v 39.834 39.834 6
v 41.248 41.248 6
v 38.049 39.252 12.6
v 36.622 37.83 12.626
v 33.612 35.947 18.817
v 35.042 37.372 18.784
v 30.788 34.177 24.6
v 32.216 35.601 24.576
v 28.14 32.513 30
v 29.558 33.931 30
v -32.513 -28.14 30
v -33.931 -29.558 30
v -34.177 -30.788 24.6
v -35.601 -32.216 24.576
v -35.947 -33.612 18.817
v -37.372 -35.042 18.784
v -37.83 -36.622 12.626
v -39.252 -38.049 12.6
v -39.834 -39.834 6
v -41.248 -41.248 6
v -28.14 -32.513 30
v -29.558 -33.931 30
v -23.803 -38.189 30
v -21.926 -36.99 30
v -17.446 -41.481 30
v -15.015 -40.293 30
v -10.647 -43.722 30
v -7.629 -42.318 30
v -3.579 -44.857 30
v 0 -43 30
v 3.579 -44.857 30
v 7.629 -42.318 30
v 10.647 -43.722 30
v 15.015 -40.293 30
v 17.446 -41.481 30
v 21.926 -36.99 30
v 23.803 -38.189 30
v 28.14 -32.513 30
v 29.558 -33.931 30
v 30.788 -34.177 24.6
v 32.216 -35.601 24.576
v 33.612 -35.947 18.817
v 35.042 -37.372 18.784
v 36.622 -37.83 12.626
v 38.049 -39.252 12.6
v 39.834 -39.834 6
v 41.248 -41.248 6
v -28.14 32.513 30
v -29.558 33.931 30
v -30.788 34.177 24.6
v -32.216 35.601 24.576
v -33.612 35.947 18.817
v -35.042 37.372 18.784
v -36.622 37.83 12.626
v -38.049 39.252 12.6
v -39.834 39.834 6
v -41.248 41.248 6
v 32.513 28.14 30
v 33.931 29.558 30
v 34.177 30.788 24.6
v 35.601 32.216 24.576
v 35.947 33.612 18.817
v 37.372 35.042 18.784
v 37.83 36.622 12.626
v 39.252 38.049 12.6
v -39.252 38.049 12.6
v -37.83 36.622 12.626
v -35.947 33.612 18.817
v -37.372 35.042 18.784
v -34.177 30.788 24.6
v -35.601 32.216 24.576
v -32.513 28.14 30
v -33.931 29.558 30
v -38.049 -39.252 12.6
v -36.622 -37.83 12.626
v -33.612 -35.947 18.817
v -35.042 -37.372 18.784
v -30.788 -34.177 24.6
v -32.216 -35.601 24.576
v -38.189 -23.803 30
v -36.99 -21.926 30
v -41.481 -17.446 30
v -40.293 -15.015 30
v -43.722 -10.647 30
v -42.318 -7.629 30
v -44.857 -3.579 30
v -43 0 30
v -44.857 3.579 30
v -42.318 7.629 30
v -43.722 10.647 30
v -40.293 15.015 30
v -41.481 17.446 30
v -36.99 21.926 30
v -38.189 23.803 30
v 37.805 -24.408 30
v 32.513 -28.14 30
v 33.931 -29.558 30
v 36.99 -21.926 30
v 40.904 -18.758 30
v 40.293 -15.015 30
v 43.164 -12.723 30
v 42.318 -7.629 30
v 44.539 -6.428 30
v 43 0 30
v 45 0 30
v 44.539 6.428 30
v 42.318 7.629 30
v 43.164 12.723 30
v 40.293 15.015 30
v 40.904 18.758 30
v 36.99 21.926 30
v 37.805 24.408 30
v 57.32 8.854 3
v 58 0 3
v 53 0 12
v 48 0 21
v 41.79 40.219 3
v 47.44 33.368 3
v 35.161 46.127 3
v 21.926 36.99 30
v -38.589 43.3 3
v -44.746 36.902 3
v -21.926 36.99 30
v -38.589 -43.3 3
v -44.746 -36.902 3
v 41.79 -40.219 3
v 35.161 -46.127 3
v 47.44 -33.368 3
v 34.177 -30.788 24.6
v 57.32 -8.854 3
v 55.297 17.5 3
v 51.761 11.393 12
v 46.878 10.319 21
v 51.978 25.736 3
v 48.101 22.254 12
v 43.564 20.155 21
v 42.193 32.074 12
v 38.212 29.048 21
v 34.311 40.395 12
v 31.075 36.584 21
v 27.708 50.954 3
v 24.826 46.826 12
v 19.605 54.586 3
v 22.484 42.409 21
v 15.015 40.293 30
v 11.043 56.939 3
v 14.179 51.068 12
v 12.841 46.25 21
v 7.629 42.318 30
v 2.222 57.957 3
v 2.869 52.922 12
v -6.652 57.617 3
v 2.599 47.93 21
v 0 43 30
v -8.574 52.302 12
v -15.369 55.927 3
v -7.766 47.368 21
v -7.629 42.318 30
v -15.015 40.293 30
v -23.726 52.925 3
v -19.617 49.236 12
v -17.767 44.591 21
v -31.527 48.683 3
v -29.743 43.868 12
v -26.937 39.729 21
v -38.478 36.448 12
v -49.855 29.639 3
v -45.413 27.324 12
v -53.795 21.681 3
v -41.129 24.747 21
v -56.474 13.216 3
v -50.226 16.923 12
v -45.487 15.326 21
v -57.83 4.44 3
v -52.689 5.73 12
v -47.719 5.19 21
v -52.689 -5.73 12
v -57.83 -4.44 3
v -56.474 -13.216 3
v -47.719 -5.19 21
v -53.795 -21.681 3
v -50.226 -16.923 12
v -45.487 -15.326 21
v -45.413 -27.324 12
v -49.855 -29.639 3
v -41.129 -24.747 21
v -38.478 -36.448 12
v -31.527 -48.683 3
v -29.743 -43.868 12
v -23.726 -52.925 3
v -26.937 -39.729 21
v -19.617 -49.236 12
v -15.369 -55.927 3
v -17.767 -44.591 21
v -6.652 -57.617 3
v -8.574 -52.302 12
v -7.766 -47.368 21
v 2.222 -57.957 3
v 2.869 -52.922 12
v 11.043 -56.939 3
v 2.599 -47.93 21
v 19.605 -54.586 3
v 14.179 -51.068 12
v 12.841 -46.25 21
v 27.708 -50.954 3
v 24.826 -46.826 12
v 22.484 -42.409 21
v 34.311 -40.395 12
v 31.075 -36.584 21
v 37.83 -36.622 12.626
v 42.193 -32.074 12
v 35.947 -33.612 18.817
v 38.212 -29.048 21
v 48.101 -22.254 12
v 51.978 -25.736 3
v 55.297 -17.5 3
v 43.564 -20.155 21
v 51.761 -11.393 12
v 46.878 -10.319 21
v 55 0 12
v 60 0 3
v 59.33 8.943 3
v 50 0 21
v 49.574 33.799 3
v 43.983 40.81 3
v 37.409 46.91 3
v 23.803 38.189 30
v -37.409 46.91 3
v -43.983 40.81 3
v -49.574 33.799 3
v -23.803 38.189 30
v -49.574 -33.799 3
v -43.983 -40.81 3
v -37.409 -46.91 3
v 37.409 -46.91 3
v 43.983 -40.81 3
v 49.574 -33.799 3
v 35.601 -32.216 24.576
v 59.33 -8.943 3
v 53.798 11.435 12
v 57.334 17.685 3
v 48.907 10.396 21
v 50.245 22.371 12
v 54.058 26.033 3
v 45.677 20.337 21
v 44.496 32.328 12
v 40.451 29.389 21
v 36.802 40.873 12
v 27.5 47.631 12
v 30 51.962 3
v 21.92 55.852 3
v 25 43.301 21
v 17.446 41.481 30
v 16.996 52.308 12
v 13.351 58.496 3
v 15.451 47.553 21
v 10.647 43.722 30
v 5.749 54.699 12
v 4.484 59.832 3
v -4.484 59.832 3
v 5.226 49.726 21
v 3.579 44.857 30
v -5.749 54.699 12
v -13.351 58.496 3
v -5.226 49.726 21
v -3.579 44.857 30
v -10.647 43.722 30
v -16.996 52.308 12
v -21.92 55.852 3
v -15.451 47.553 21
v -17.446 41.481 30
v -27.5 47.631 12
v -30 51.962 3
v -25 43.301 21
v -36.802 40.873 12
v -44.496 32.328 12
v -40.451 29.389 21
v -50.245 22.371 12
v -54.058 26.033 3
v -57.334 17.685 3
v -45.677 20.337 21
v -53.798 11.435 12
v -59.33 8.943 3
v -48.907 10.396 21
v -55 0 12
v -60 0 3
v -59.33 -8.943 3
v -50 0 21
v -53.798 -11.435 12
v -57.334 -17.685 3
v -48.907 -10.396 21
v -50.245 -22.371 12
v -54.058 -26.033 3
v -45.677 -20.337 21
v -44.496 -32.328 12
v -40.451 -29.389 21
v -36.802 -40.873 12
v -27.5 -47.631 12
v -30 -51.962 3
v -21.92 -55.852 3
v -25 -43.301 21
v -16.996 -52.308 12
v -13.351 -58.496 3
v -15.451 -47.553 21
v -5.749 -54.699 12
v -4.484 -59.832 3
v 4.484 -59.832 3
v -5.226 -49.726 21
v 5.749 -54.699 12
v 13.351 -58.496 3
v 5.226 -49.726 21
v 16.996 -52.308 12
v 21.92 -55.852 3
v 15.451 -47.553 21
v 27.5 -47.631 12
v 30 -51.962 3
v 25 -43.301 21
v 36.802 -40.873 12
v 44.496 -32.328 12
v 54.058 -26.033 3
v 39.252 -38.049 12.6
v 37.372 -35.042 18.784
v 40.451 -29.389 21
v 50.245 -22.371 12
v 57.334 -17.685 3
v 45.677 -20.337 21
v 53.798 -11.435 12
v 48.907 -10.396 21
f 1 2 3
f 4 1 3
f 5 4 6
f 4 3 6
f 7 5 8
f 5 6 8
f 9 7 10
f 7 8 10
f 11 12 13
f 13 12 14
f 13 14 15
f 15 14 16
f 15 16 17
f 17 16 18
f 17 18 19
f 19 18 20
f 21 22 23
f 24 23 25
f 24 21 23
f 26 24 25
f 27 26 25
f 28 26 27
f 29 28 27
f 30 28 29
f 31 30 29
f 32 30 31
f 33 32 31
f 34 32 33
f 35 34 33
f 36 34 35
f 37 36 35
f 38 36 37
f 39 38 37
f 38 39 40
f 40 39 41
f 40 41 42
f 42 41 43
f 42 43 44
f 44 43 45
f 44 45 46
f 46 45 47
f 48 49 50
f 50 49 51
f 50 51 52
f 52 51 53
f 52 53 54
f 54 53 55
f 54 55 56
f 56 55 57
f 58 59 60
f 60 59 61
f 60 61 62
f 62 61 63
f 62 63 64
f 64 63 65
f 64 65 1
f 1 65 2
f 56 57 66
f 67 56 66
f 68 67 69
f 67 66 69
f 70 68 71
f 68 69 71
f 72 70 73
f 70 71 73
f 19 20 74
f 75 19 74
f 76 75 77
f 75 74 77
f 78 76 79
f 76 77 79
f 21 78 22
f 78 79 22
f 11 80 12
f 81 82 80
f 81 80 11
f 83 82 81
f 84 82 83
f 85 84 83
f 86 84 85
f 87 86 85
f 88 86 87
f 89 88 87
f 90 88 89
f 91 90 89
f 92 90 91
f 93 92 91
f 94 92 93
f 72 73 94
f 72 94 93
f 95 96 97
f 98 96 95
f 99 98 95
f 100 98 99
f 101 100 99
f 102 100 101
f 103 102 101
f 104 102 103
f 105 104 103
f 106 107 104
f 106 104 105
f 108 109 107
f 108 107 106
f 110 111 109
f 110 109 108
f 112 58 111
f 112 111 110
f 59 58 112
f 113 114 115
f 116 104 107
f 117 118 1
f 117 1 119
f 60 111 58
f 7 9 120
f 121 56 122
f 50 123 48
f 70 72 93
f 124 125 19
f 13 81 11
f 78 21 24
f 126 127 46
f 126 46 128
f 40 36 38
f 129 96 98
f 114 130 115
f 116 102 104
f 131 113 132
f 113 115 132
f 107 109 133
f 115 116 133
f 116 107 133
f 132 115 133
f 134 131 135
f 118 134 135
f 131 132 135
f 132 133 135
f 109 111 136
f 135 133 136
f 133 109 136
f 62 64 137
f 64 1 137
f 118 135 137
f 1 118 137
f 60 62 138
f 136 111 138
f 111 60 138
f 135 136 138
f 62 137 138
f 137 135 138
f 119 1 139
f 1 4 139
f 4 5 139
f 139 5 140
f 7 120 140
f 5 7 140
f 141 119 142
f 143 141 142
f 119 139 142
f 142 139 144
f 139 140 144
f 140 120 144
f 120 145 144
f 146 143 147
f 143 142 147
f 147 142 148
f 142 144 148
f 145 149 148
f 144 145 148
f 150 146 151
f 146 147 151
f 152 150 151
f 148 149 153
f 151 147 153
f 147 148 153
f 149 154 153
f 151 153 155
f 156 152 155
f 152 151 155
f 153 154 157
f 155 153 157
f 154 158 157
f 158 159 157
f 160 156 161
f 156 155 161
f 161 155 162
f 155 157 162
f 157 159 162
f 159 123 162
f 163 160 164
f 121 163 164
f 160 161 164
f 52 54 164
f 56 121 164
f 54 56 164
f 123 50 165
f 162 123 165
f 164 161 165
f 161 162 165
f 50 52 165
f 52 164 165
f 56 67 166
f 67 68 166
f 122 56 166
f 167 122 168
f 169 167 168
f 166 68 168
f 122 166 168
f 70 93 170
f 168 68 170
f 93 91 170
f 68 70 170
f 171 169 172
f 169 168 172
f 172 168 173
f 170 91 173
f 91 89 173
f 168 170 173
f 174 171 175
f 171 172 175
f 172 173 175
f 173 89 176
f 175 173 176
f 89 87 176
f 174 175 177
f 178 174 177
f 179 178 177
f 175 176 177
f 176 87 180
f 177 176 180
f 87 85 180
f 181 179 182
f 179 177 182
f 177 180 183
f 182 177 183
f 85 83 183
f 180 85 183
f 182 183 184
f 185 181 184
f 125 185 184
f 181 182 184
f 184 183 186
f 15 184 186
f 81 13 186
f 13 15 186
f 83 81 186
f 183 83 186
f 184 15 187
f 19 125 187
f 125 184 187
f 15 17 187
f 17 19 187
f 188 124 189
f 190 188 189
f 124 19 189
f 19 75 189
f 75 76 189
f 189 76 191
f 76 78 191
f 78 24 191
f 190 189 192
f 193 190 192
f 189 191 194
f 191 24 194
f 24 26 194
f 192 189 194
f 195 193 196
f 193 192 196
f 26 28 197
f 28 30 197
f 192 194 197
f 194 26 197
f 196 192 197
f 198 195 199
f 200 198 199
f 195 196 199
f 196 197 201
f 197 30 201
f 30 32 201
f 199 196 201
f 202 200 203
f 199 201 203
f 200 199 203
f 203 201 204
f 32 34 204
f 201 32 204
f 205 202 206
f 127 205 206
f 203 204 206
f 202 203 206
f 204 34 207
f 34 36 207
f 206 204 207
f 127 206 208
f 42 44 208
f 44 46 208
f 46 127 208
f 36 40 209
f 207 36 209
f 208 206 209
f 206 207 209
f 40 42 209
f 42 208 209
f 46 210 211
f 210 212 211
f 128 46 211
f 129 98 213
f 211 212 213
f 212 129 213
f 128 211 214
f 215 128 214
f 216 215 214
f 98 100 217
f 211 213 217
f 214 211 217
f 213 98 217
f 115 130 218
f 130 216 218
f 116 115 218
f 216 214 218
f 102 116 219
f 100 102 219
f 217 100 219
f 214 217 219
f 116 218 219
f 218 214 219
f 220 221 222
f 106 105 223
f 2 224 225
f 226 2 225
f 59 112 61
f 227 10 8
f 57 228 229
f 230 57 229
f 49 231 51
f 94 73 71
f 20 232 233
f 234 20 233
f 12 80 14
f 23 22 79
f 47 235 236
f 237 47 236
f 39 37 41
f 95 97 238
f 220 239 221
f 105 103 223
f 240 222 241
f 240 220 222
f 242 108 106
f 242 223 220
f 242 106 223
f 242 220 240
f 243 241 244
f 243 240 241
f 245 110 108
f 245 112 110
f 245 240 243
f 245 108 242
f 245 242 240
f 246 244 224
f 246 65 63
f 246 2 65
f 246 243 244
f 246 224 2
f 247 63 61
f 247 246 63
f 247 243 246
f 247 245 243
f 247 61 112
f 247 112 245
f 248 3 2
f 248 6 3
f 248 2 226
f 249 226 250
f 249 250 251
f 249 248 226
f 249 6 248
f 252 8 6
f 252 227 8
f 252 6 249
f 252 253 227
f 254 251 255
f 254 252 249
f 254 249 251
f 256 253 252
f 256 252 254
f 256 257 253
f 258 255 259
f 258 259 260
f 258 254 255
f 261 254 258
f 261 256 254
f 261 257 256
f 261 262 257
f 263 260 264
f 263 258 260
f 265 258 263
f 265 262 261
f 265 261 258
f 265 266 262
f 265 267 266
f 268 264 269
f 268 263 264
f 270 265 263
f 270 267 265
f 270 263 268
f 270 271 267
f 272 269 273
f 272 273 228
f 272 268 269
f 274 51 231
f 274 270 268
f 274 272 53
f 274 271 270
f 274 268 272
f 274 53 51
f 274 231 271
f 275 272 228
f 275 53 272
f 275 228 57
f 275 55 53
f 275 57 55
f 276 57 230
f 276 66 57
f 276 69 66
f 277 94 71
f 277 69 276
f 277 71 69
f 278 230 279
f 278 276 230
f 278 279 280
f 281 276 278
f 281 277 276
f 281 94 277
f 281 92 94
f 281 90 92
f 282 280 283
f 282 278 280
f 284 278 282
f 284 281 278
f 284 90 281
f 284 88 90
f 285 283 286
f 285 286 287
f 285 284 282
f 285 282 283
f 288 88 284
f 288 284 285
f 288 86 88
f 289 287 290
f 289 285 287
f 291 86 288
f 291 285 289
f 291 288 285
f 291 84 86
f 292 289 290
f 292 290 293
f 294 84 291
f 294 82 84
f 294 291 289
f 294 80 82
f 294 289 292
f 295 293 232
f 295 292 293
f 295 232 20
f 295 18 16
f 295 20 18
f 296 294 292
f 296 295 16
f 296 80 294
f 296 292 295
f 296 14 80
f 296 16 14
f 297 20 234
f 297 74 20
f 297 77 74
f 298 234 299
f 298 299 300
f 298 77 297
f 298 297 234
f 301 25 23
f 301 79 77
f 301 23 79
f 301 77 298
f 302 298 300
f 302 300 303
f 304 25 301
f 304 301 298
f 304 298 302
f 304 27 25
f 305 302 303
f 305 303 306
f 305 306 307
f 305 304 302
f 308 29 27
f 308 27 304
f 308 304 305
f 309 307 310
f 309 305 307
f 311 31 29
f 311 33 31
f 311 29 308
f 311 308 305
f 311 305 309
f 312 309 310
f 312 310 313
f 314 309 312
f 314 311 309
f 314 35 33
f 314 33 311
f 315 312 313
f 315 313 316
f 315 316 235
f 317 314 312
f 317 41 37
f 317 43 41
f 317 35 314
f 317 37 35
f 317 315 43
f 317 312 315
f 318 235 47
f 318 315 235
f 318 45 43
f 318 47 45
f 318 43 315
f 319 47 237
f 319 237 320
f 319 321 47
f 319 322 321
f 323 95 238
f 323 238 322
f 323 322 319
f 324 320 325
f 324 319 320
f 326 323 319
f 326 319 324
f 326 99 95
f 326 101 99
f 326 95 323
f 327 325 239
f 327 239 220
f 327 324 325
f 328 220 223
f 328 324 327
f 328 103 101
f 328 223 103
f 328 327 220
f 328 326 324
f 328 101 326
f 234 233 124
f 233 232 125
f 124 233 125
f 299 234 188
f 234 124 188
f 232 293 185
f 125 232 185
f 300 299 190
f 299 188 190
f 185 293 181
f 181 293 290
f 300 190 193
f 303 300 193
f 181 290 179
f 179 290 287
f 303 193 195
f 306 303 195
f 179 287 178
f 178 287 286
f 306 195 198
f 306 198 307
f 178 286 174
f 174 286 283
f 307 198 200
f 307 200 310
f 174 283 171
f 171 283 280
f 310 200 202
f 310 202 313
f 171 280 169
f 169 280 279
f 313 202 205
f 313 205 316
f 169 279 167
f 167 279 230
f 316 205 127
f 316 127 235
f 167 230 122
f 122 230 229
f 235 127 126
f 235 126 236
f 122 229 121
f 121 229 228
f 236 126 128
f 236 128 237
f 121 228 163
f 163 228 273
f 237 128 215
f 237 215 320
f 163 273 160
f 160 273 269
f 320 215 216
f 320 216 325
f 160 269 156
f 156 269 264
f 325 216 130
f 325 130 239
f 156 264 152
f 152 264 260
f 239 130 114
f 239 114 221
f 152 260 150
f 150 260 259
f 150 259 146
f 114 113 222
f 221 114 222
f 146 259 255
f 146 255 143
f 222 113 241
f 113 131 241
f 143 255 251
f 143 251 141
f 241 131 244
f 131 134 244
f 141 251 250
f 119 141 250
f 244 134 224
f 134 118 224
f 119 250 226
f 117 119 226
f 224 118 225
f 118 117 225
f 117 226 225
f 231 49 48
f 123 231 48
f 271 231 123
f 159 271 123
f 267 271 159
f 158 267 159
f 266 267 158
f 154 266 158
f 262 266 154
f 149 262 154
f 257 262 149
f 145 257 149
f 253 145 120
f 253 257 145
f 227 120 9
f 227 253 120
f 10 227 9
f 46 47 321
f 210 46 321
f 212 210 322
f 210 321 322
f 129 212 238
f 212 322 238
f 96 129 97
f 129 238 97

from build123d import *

# Parameters (mm, degrees)
SKETCH018_R           = 58
SKETCH019_R           = 43
SKETCH016_R           = 60
SKETCH017_R           = 45
POCKET003_DEPTH       = 33
POLARPATTERN005_COUNT = 4


with BuildPart() as loft001:
    # Sketch018 → Loft001 section 0
    with BuildSketch(Plane.XY.offset(3)):
        Circle(SKETCH018_R)
    # Sketch019 → Loft001 section 1
    with BuildSketch(Plane.XY.offset(30)):
        Circle(SKETCH019_R)
    loft()


with BuildPart() as support:
    # Sketch016 → Loft section 0
    with BuildSketch(Plane.XY.offset(3)):
        Circle(SKETCH016_R)
    # Sketch017 → Loft section 1
    with BuildSketch(Plane.XY.offset(30)):
        Circle(SKETCH017_R)
    loft()

    # Cut: cut Loft001
    add(loft001.part, mode=Mode.SUBTRACT)

    # Sketch020 → Pocket003 (cut)
    with BuildSketch(Plane(origin=(-50, -50, 0), x_dir=(-0.707107, 0.707107, 0), z_dir=(0.707107, 0.707107, 0))):
        Polygon((0, 6), (-3.748315, 35.090931), (3.748315, 35.090931), align=None)
    pocket003 = extrude(amount=POCKET003_DEPTH, mode=Mode.SUBTRACT)

    # PolarPattern005: Pocket003 ×4 about axis
    polarpattern005_axis = Axis((0, 0, 0), (0, 0, 1))
    for i in range(1, POLARPATTERN005_COUNT):
        add(pocket003.rotate(polarpattern005_axis, i * 360 / POLARPATTERN005_COUNT), mode=Mode.SUBTRACT)


solid = support.part
